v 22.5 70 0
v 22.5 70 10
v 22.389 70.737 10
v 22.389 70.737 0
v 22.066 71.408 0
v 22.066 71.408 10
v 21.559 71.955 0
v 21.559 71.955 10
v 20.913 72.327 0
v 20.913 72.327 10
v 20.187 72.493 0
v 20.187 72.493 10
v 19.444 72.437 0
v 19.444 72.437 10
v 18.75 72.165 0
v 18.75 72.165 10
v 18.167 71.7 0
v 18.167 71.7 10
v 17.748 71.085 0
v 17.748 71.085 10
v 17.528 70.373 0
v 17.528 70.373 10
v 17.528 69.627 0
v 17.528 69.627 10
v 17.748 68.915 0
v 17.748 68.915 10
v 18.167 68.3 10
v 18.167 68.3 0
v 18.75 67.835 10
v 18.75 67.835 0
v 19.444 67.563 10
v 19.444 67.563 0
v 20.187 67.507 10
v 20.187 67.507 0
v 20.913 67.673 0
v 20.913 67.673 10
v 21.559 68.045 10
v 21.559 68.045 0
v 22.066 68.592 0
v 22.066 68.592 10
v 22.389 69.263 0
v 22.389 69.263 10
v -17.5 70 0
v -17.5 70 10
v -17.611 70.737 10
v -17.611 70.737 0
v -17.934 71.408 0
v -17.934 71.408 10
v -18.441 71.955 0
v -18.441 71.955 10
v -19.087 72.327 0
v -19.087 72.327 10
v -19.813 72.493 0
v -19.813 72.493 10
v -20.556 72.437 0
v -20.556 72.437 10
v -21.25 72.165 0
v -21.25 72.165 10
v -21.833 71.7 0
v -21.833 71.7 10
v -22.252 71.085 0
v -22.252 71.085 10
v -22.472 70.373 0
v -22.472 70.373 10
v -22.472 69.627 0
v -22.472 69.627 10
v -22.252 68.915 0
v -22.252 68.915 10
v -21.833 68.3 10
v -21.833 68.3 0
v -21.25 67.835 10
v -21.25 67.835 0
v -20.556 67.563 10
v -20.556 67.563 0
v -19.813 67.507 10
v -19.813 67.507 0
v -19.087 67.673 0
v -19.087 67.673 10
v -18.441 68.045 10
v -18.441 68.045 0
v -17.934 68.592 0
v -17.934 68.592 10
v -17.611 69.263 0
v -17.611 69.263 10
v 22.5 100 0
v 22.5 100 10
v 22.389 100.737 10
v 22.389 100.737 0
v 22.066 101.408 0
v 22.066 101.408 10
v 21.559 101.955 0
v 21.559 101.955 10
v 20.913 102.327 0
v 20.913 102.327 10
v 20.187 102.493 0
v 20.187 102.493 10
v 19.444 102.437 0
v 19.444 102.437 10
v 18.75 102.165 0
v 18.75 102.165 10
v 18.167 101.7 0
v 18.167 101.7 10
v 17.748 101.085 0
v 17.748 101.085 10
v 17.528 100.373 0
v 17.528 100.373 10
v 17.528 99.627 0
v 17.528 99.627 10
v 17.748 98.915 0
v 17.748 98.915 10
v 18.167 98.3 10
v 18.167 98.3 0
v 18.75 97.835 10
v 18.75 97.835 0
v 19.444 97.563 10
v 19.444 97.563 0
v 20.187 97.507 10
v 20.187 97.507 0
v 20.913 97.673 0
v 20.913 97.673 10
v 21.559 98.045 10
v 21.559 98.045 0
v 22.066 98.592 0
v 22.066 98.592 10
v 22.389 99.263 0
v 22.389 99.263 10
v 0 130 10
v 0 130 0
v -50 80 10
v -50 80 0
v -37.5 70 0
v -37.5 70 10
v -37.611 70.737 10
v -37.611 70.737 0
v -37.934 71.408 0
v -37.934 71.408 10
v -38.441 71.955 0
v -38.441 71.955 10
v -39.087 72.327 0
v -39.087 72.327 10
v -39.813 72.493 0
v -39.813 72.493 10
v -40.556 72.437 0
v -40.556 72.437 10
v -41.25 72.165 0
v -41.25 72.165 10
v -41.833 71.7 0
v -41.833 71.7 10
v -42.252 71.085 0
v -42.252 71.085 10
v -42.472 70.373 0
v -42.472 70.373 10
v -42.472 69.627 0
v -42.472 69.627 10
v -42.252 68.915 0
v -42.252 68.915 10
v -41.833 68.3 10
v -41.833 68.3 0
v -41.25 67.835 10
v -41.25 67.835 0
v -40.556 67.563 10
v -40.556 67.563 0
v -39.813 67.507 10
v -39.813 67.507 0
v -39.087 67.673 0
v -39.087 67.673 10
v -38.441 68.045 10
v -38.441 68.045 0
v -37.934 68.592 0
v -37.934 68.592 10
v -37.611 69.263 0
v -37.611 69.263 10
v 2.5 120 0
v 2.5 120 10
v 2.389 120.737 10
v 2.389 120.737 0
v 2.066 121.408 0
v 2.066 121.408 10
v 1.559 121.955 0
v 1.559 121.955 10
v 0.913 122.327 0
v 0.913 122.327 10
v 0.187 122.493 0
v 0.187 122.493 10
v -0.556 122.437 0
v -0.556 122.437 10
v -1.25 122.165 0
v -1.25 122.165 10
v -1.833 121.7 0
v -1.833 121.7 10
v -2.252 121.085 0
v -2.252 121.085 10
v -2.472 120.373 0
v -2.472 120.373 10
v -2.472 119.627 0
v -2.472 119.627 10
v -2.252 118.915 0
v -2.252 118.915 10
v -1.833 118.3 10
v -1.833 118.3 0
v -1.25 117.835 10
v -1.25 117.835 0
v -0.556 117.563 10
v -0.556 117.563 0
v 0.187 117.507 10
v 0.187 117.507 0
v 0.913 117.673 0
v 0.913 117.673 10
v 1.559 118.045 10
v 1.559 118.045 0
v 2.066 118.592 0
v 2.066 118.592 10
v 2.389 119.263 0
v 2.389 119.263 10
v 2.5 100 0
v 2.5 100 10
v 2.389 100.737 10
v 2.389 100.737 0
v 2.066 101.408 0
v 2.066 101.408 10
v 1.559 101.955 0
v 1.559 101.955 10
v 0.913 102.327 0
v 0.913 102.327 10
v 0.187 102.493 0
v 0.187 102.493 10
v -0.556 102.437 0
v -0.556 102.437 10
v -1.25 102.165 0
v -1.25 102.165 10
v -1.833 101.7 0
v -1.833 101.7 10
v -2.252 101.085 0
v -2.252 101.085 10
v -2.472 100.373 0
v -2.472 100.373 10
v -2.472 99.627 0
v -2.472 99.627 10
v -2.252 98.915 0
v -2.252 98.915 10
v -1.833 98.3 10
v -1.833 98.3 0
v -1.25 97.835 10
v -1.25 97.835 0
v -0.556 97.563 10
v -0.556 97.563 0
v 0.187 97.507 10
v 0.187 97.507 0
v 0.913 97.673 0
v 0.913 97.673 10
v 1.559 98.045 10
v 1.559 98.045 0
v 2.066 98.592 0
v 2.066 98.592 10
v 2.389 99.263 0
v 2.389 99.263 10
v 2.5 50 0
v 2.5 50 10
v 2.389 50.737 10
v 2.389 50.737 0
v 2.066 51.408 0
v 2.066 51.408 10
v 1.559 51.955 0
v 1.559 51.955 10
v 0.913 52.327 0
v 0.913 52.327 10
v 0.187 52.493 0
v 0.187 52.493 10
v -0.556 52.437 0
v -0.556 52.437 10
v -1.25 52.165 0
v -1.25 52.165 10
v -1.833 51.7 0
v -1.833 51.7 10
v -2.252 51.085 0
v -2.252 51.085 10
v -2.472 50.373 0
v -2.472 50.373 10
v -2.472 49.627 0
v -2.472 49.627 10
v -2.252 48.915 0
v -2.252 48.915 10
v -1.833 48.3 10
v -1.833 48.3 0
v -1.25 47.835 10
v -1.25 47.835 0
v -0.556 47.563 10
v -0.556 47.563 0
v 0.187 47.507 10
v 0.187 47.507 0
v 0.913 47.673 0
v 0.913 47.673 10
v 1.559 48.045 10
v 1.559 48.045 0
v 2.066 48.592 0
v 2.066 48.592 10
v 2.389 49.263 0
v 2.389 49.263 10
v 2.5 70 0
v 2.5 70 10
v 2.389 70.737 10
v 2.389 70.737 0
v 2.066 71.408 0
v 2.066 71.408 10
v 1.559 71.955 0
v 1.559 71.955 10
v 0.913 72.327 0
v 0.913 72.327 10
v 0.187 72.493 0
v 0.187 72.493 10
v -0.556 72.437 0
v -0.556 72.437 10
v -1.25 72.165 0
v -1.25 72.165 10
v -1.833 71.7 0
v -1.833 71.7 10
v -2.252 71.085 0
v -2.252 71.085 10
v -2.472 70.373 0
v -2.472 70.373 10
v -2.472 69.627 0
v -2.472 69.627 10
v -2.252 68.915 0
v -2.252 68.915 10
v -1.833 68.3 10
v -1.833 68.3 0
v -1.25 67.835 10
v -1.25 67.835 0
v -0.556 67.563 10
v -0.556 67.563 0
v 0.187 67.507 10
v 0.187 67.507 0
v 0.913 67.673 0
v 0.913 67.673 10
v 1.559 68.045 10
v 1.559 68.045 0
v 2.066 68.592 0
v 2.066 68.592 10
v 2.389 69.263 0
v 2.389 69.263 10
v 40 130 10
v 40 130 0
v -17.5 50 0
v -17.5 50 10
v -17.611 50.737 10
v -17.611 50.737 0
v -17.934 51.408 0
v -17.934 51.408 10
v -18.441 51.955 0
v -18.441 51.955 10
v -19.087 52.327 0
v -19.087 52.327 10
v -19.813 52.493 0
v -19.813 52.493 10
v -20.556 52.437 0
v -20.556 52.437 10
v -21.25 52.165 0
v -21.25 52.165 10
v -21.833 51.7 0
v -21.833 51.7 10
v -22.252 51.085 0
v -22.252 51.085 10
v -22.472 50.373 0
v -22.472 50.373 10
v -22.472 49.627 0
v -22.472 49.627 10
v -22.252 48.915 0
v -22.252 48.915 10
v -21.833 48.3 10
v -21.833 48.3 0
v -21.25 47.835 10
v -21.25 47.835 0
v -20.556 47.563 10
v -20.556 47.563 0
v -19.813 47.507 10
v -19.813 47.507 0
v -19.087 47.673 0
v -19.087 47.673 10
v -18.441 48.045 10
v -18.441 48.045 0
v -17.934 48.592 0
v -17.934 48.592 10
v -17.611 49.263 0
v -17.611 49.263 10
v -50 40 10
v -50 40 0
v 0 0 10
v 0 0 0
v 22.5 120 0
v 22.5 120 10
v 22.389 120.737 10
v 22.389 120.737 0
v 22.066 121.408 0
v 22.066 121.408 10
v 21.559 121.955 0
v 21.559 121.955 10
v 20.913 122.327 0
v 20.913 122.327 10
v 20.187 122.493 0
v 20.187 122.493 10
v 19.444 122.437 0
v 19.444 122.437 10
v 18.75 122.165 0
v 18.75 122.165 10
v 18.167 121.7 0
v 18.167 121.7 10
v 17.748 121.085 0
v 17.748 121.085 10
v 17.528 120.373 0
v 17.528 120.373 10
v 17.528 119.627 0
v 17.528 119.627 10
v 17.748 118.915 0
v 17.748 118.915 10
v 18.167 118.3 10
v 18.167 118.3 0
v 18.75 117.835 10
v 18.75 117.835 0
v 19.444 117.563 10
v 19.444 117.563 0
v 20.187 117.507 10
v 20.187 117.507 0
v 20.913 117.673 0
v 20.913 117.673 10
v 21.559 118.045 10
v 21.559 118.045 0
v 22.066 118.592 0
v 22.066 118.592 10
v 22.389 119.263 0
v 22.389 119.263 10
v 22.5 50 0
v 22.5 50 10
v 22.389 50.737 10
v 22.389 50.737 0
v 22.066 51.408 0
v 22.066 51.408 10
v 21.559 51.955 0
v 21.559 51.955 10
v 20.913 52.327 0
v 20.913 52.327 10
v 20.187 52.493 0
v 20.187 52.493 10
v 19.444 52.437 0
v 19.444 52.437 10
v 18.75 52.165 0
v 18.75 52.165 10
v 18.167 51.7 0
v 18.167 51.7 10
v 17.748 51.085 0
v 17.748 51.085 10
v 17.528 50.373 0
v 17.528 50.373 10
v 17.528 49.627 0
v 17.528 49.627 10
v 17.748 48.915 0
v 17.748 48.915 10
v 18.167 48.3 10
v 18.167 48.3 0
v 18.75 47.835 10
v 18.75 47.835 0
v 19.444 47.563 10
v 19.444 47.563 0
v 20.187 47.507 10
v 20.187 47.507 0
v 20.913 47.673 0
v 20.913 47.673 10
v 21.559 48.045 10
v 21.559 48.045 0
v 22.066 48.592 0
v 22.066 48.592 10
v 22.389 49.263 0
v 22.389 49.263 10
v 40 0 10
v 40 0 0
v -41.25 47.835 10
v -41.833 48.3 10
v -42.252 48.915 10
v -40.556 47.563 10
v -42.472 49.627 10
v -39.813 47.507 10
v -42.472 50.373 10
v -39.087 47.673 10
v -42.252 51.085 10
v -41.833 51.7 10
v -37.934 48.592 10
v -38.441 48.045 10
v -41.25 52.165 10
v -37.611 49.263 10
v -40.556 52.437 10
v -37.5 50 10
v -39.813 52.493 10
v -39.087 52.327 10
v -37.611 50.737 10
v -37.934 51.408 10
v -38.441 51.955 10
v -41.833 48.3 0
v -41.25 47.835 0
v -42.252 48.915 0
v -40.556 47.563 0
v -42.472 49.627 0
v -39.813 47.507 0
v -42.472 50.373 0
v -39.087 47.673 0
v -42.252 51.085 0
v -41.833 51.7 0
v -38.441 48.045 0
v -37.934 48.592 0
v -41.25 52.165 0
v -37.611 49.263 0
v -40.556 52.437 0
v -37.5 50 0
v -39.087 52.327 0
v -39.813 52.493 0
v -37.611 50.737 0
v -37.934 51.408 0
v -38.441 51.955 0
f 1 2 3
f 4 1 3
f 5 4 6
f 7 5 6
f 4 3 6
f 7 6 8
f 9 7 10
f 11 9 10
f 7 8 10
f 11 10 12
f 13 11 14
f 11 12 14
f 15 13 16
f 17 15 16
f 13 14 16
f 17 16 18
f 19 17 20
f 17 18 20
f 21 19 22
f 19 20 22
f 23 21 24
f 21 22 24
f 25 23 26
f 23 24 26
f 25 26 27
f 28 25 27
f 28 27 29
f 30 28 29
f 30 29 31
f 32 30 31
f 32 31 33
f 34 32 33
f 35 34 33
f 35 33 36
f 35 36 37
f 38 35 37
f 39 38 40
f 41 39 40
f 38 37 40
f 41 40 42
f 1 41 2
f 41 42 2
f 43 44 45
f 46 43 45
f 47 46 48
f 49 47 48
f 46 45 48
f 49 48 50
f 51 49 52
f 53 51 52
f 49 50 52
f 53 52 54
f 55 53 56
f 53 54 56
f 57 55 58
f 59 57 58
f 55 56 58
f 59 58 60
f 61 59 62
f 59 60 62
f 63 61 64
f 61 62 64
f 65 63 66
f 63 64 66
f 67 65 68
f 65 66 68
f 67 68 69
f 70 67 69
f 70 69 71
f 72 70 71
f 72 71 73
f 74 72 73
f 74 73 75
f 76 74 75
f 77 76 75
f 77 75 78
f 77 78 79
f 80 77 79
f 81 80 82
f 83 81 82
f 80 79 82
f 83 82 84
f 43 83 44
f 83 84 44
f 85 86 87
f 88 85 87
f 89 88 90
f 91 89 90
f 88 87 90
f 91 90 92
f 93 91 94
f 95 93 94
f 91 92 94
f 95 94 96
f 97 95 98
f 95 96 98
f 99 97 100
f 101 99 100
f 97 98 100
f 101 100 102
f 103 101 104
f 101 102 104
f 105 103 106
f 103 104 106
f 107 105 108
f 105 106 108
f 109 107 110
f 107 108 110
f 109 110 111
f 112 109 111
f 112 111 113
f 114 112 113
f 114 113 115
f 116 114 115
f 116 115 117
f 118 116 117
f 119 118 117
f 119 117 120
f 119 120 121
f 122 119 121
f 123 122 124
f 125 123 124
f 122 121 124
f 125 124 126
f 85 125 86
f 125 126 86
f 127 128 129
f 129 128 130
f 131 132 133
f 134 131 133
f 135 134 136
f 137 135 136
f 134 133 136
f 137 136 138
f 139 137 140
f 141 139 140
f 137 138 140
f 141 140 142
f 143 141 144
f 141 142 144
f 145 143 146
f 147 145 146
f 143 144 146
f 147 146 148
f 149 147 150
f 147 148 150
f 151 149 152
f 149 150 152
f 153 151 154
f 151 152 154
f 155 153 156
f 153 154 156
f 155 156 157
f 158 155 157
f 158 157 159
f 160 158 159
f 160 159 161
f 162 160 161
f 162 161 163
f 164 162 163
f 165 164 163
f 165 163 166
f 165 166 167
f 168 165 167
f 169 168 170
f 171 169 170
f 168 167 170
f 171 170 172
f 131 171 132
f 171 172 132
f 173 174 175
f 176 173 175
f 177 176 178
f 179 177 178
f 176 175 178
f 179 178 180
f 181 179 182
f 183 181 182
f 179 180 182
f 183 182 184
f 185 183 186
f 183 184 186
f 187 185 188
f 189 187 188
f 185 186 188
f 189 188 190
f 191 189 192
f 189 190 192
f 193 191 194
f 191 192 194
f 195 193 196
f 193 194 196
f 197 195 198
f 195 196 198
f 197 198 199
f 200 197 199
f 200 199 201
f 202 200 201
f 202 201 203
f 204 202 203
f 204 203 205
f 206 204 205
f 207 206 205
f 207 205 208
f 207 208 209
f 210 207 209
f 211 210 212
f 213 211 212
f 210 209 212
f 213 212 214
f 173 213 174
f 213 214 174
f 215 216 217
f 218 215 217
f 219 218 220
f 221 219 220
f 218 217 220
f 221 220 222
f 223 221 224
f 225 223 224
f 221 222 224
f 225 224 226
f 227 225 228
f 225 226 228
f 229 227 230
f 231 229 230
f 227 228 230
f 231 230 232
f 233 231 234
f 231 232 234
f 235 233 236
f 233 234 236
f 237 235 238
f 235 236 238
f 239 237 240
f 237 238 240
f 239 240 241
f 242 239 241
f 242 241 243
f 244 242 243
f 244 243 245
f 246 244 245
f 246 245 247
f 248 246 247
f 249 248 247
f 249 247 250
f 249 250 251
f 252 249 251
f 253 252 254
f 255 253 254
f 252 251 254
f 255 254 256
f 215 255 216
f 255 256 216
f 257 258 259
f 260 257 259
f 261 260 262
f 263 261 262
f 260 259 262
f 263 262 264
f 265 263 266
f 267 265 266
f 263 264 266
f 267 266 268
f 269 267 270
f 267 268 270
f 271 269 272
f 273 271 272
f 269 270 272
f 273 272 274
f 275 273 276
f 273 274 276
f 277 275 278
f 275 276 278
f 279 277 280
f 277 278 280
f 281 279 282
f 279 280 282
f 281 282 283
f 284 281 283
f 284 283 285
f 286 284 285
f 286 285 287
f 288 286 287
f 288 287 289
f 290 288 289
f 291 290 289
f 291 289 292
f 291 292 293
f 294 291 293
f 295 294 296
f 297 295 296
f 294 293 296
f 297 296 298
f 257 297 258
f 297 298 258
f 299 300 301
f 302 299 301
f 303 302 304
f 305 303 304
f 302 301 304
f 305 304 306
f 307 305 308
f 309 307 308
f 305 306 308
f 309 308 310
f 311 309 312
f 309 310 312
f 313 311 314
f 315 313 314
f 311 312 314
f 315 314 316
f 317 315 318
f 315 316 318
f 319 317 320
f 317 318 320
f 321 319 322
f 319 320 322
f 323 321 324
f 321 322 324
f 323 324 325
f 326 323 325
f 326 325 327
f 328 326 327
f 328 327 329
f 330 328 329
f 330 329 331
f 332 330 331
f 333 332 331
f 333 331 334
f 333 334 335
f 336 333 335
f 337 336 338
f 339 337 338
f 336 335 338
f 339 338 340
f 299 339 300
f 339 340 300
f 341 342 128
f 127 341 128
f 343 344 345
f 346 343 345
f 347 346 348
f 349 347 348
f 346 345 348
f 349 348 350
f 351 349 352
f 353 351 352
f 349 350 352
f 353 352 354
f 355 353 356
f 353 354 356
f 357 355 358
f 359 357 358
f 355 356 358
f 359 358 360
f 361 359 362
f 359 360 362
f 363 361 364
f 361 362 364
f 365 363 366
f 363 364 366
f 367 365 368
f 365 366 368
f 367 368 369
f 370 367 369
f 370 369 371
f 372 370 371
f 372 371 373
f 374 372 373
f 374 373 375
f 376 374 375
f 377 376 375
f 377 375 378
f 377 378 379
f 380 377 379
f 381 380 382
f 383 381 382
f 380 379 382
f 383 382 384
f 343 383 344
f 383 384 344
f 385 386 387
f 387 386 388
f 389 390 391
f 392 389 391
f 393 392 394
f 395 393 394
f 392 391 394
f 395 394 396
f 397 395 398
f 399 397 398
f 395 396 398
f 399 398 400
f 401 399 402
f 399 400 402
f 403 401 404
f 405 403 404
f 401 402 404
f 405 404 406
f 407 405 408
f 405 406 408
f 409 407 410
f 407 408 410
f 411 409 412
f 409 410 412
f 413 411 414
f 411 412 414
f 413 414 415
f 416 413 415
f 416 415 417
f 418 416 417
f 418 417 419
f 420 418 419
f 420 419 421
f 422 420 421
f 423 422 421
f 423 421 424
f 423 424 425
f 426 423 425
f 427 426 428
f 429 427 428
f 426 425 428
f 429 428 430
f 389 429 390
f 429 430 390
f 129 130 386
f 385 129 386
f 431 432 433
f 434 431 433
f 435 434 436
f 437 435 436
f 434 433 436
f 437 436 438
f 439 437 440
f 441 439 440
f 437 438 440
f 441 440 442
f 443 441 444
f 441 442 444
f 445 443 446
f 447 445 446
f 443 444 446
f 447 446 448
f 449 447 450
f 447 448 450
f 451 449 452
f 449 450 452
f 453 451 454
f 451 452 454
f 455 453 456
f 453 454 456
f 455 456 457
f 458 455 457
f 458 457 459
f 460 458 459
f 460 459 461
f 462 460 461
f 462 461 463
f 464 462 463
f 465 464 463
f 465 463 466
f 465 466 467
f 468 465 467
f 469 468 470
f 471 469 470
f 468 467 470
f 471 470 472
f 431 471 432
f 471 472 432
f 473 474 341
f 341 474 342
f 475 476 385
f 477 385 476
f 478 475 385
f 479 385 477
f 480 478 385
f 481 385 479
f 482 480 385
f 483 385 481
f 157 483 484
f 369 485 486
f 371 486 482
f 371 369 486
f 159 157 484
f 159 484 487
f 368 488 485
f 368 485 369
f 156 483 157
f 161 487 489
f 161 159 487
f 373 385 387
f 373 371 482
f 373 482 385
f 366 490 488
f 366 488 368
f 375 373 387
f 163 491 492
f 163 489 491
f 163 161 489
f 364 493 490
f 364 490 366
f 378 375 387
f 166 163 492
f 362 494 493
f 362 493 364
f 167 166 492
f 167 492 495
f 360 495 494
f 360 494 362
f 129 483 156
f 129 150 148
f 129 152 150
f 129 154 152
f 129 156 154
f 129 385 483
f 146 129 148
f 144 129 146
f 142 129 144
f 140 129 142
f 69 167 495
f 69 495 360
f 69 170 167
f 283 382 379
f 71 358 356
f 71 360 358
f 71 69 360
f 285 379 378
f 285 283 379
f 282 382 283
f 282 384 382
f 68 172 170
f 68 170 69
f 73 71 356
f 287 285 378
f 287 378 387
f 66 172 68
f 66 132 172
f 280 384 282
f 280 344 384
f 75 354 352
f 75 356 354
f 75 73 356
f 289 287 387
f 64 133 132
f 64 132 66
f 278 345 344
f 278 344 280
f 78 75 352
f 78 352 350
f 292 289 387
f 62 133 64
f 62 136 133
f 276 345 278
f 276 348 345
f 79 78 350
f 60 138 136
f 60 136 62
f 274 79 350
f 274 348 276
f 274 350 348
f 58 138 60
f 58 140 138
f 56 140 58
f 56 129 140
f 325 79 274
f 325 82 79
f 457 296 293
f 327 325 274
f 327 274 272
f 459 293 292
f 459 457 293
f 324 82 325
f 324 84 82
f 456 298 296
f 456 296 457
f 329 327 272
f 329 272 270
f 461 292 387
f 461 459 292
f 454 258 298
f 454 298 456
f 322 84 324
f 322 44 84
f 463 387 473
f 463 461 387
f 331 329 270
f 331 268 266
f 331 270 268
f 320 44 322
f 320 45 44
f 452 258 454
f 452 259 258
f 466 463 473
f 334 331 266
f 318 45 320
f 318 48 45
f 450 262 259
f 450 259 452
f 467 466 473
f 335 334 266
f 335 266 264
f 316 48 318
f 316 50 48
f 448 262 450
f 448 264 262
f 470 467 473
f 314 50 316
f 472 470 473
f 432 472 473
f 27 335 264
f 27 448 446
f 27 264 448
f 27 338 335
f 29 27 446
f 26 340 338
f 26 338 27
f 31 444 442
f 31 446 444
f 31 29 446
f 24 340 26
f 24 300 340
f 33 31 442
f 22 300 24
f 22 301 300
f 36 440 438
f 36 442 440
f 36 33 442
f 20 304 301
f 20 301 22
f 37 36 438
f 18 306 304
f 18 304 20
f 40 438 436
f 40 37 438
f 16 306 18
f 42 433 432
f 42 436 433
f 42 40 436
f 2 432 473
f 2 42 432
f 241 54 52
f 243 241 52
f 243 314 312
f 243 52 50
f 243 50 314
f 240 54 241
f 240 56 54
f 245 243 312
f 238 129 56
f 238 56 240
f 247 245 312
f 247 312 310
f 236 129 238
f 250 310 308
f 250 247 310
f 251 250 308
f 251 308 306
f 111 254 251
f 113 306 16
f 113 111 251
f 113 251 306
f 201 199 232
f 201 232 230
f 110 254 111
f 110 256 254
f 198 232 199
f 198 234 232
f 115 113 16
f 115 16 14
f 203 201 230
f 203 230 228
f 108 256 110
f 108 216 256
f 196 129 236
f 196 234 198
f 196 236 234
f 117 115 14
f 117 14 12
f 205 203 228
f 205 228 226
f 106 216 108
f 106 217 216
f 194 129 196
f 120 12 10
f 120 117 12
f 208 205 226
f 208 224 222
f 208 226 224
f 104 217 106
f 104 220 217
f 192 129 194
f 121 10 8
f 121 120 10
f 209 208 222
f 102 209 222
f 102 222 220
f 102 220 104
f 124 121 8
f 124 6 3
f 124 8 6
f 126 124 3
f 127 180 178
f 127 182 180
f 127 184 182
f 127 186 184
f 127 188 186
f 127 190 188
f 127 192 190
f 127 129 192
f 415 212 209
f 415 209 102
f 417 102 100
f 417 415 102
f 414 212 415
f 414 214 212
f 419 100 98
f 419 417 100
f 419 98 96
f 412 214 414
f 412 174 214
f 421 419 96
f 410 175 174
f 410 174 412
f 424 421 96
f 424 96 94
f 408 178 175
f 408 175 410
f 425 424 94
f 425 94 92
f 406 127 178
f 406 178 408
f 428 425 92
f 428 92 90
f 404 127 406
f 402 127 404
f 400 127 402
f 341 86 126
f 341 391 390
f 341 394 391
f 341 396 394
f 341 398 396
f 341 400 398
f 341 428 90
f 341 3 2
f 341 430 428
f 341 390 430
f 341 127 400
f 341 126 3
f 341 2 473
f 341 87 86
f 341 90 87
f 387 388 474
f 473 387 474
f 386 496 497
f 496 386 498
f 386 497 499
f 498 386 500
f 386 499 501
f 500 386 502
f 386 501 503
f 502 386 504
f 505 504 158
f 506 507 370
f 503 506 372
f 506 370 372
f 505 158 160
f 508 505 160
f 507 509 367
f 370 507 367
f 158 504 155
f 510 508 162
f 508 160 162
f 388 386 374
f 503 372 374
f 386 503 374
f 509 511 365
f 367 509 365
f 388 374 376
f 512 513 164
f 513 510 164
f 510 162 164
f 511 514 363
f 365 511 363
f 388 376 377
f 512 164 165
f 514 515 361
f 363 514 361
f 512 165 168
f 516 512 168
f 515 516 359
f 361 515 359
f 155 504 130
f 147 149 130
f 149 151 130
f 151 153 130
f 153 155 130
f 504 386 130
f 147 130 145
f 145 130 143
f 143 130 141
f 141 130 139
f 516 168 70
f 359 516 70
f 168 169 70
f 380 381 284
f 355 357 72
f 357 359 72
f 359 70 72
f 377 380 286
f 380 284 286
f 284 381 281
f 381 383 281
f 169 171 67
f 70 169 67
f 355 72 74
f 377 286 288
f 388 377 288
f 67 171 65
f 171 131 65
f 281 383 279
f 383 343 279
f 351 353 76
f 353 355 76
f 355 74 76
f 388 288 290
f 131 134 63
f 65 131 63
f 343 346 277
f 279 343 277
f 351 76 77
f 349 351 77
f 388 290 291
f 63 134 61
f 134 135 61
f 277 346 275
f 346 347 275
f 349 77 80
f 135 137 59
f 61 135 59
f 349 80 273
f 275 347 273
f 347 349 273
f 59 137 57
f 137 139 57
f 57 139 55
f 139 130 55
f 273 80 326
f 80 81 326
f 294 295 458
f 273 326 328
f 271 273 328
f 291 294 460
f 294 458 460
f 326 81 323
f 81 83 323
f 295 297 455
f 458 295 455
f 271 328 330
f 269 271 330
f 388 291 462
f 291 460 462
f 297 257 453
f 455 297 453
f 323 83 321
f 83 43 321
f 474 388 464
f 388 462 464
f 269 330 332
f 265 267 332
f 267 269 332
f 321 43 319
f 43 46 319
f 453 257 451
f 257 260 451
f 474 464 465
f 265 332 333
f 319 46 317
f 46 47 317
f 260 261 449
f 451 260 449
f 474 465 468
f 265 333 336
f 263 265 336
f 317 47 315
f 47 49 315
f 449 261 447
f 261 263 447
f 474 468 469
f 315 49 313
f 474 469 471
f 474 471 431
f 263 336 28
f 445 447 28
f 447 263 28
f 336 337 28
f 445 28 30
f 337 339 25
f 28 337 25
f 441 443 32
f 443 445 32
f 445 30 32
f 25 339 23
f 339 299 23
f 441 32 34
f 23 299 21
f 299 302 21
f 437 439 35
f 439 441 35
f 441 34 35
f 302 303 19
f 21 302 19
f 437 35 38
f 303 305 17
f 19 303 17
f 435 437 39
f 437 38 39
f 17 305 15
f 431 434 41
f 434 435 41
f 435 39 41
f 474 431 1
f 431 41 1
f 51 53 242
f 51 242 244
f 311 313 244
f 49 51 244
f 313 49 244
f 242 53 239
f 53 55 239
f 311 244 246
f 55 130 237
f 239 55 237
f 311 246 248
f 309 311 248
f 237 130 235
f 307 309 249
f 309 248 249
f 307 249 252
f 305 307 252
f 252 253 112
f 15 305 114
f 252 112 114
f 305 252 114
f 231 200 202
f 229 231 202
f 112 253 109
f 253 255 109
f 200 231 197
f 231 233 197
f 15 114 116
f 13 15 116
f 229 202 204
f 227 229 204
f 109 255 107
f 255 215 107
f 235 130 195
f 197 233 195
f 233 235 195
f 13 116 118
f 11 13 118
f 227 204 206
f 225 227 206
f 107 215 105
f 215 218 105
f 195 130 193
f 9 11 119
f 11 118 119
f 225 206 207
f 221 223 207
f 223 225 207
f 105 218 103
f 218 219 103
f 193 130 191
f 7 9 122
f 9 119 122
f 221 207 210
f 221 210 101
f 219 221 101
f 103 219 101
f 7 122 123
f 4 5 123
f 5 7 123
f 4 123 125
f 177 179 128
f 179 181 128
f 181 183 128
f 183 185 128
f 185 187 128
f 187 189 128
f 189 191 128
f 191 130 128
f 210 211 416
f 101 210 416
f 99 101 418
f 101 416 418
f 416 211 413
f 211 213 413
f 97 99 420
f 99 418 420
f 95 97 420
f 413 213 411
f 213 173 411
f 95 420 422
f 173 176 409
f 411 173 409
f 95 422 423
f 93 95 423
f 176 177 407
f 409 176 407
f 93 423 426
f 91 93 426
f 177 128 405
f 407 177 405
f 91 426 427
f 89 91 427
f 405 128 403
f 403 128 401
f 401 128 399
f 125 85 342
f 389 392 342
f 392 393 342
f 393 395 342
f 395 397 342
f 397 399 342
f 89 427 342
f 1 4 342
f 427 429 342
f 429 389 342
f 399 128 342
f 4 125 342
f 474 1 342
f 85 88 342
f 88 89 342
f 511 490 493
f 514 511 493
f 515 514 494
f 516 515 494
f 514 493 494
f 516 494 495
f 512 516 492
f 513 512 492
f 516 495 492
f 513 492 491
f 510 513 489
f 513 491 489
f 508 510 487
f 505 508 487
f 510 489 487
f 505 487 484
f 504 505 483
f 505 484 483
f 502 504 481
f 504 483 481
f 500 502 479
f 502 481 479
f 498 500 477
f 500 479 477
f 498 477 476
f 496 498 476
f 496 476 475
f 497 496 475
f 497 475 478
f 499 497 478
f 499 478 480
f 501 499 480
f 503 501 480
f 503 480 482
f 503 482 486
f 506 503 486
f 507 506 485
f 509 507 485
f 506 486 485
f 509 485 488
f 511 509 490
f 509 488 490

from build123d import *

# Parameters (mm, degrees)
BOSS_EXTRUDE1_DEPTH = 10
SKETCH2_R           = 2.5
CUT_EXTRUDE1_DEPTH  = 10


with BuildPart() as part:
    # Sketch1 → Boss-Extrude1 (new body)
    with BuildSketch(Plane.XY):
        Polygon((0, 0), (40, 0), (40, 130), (0, 130), (-50, 80), (-50, 40), align=None)
    extrude(amount=BOSS_EXTRUDE1_DEPTH)

    # Sketch2 → Cut-Extrude1 (cut)
    with BuildSketch(Plane.XY.offset(10)):
        with Locations((0, 120)):
            Circle(SKETCH2_R)
        with Locations((20, 120)):
            Circle(SKETCH2_R)
        with Locations((0, 100)):
            Circle(SKETCH2_R)
        with Locations((20, 100)):
            Circle(SKETCH2_R)
        with Locations((-40, 70)):
            Circle(SKETCH2_R)
        with Locations((-20, 70)):
            Circle(SKETCH2_R)
        with Locations((-40, 50)):
            Circle(SKETCH2_R)
        with Locations((-20, 50)):
            Circle(SKETCH2_R)
        with Locations((0, 70)):
            Circle(SKETCH2_R)
        with Locations((20, 70)):
            Circle(SKETCH2_R)
        with Locations((0, 50)):
            Circle(SKETCH2_R)
        with Locations((20, 50)):
            Circle(SKETCH2_R)
    extrude(amount=-CUT_EXTRUDE1_DEPTH, mode=Mode.SUBTRACT)


solid = part.part
